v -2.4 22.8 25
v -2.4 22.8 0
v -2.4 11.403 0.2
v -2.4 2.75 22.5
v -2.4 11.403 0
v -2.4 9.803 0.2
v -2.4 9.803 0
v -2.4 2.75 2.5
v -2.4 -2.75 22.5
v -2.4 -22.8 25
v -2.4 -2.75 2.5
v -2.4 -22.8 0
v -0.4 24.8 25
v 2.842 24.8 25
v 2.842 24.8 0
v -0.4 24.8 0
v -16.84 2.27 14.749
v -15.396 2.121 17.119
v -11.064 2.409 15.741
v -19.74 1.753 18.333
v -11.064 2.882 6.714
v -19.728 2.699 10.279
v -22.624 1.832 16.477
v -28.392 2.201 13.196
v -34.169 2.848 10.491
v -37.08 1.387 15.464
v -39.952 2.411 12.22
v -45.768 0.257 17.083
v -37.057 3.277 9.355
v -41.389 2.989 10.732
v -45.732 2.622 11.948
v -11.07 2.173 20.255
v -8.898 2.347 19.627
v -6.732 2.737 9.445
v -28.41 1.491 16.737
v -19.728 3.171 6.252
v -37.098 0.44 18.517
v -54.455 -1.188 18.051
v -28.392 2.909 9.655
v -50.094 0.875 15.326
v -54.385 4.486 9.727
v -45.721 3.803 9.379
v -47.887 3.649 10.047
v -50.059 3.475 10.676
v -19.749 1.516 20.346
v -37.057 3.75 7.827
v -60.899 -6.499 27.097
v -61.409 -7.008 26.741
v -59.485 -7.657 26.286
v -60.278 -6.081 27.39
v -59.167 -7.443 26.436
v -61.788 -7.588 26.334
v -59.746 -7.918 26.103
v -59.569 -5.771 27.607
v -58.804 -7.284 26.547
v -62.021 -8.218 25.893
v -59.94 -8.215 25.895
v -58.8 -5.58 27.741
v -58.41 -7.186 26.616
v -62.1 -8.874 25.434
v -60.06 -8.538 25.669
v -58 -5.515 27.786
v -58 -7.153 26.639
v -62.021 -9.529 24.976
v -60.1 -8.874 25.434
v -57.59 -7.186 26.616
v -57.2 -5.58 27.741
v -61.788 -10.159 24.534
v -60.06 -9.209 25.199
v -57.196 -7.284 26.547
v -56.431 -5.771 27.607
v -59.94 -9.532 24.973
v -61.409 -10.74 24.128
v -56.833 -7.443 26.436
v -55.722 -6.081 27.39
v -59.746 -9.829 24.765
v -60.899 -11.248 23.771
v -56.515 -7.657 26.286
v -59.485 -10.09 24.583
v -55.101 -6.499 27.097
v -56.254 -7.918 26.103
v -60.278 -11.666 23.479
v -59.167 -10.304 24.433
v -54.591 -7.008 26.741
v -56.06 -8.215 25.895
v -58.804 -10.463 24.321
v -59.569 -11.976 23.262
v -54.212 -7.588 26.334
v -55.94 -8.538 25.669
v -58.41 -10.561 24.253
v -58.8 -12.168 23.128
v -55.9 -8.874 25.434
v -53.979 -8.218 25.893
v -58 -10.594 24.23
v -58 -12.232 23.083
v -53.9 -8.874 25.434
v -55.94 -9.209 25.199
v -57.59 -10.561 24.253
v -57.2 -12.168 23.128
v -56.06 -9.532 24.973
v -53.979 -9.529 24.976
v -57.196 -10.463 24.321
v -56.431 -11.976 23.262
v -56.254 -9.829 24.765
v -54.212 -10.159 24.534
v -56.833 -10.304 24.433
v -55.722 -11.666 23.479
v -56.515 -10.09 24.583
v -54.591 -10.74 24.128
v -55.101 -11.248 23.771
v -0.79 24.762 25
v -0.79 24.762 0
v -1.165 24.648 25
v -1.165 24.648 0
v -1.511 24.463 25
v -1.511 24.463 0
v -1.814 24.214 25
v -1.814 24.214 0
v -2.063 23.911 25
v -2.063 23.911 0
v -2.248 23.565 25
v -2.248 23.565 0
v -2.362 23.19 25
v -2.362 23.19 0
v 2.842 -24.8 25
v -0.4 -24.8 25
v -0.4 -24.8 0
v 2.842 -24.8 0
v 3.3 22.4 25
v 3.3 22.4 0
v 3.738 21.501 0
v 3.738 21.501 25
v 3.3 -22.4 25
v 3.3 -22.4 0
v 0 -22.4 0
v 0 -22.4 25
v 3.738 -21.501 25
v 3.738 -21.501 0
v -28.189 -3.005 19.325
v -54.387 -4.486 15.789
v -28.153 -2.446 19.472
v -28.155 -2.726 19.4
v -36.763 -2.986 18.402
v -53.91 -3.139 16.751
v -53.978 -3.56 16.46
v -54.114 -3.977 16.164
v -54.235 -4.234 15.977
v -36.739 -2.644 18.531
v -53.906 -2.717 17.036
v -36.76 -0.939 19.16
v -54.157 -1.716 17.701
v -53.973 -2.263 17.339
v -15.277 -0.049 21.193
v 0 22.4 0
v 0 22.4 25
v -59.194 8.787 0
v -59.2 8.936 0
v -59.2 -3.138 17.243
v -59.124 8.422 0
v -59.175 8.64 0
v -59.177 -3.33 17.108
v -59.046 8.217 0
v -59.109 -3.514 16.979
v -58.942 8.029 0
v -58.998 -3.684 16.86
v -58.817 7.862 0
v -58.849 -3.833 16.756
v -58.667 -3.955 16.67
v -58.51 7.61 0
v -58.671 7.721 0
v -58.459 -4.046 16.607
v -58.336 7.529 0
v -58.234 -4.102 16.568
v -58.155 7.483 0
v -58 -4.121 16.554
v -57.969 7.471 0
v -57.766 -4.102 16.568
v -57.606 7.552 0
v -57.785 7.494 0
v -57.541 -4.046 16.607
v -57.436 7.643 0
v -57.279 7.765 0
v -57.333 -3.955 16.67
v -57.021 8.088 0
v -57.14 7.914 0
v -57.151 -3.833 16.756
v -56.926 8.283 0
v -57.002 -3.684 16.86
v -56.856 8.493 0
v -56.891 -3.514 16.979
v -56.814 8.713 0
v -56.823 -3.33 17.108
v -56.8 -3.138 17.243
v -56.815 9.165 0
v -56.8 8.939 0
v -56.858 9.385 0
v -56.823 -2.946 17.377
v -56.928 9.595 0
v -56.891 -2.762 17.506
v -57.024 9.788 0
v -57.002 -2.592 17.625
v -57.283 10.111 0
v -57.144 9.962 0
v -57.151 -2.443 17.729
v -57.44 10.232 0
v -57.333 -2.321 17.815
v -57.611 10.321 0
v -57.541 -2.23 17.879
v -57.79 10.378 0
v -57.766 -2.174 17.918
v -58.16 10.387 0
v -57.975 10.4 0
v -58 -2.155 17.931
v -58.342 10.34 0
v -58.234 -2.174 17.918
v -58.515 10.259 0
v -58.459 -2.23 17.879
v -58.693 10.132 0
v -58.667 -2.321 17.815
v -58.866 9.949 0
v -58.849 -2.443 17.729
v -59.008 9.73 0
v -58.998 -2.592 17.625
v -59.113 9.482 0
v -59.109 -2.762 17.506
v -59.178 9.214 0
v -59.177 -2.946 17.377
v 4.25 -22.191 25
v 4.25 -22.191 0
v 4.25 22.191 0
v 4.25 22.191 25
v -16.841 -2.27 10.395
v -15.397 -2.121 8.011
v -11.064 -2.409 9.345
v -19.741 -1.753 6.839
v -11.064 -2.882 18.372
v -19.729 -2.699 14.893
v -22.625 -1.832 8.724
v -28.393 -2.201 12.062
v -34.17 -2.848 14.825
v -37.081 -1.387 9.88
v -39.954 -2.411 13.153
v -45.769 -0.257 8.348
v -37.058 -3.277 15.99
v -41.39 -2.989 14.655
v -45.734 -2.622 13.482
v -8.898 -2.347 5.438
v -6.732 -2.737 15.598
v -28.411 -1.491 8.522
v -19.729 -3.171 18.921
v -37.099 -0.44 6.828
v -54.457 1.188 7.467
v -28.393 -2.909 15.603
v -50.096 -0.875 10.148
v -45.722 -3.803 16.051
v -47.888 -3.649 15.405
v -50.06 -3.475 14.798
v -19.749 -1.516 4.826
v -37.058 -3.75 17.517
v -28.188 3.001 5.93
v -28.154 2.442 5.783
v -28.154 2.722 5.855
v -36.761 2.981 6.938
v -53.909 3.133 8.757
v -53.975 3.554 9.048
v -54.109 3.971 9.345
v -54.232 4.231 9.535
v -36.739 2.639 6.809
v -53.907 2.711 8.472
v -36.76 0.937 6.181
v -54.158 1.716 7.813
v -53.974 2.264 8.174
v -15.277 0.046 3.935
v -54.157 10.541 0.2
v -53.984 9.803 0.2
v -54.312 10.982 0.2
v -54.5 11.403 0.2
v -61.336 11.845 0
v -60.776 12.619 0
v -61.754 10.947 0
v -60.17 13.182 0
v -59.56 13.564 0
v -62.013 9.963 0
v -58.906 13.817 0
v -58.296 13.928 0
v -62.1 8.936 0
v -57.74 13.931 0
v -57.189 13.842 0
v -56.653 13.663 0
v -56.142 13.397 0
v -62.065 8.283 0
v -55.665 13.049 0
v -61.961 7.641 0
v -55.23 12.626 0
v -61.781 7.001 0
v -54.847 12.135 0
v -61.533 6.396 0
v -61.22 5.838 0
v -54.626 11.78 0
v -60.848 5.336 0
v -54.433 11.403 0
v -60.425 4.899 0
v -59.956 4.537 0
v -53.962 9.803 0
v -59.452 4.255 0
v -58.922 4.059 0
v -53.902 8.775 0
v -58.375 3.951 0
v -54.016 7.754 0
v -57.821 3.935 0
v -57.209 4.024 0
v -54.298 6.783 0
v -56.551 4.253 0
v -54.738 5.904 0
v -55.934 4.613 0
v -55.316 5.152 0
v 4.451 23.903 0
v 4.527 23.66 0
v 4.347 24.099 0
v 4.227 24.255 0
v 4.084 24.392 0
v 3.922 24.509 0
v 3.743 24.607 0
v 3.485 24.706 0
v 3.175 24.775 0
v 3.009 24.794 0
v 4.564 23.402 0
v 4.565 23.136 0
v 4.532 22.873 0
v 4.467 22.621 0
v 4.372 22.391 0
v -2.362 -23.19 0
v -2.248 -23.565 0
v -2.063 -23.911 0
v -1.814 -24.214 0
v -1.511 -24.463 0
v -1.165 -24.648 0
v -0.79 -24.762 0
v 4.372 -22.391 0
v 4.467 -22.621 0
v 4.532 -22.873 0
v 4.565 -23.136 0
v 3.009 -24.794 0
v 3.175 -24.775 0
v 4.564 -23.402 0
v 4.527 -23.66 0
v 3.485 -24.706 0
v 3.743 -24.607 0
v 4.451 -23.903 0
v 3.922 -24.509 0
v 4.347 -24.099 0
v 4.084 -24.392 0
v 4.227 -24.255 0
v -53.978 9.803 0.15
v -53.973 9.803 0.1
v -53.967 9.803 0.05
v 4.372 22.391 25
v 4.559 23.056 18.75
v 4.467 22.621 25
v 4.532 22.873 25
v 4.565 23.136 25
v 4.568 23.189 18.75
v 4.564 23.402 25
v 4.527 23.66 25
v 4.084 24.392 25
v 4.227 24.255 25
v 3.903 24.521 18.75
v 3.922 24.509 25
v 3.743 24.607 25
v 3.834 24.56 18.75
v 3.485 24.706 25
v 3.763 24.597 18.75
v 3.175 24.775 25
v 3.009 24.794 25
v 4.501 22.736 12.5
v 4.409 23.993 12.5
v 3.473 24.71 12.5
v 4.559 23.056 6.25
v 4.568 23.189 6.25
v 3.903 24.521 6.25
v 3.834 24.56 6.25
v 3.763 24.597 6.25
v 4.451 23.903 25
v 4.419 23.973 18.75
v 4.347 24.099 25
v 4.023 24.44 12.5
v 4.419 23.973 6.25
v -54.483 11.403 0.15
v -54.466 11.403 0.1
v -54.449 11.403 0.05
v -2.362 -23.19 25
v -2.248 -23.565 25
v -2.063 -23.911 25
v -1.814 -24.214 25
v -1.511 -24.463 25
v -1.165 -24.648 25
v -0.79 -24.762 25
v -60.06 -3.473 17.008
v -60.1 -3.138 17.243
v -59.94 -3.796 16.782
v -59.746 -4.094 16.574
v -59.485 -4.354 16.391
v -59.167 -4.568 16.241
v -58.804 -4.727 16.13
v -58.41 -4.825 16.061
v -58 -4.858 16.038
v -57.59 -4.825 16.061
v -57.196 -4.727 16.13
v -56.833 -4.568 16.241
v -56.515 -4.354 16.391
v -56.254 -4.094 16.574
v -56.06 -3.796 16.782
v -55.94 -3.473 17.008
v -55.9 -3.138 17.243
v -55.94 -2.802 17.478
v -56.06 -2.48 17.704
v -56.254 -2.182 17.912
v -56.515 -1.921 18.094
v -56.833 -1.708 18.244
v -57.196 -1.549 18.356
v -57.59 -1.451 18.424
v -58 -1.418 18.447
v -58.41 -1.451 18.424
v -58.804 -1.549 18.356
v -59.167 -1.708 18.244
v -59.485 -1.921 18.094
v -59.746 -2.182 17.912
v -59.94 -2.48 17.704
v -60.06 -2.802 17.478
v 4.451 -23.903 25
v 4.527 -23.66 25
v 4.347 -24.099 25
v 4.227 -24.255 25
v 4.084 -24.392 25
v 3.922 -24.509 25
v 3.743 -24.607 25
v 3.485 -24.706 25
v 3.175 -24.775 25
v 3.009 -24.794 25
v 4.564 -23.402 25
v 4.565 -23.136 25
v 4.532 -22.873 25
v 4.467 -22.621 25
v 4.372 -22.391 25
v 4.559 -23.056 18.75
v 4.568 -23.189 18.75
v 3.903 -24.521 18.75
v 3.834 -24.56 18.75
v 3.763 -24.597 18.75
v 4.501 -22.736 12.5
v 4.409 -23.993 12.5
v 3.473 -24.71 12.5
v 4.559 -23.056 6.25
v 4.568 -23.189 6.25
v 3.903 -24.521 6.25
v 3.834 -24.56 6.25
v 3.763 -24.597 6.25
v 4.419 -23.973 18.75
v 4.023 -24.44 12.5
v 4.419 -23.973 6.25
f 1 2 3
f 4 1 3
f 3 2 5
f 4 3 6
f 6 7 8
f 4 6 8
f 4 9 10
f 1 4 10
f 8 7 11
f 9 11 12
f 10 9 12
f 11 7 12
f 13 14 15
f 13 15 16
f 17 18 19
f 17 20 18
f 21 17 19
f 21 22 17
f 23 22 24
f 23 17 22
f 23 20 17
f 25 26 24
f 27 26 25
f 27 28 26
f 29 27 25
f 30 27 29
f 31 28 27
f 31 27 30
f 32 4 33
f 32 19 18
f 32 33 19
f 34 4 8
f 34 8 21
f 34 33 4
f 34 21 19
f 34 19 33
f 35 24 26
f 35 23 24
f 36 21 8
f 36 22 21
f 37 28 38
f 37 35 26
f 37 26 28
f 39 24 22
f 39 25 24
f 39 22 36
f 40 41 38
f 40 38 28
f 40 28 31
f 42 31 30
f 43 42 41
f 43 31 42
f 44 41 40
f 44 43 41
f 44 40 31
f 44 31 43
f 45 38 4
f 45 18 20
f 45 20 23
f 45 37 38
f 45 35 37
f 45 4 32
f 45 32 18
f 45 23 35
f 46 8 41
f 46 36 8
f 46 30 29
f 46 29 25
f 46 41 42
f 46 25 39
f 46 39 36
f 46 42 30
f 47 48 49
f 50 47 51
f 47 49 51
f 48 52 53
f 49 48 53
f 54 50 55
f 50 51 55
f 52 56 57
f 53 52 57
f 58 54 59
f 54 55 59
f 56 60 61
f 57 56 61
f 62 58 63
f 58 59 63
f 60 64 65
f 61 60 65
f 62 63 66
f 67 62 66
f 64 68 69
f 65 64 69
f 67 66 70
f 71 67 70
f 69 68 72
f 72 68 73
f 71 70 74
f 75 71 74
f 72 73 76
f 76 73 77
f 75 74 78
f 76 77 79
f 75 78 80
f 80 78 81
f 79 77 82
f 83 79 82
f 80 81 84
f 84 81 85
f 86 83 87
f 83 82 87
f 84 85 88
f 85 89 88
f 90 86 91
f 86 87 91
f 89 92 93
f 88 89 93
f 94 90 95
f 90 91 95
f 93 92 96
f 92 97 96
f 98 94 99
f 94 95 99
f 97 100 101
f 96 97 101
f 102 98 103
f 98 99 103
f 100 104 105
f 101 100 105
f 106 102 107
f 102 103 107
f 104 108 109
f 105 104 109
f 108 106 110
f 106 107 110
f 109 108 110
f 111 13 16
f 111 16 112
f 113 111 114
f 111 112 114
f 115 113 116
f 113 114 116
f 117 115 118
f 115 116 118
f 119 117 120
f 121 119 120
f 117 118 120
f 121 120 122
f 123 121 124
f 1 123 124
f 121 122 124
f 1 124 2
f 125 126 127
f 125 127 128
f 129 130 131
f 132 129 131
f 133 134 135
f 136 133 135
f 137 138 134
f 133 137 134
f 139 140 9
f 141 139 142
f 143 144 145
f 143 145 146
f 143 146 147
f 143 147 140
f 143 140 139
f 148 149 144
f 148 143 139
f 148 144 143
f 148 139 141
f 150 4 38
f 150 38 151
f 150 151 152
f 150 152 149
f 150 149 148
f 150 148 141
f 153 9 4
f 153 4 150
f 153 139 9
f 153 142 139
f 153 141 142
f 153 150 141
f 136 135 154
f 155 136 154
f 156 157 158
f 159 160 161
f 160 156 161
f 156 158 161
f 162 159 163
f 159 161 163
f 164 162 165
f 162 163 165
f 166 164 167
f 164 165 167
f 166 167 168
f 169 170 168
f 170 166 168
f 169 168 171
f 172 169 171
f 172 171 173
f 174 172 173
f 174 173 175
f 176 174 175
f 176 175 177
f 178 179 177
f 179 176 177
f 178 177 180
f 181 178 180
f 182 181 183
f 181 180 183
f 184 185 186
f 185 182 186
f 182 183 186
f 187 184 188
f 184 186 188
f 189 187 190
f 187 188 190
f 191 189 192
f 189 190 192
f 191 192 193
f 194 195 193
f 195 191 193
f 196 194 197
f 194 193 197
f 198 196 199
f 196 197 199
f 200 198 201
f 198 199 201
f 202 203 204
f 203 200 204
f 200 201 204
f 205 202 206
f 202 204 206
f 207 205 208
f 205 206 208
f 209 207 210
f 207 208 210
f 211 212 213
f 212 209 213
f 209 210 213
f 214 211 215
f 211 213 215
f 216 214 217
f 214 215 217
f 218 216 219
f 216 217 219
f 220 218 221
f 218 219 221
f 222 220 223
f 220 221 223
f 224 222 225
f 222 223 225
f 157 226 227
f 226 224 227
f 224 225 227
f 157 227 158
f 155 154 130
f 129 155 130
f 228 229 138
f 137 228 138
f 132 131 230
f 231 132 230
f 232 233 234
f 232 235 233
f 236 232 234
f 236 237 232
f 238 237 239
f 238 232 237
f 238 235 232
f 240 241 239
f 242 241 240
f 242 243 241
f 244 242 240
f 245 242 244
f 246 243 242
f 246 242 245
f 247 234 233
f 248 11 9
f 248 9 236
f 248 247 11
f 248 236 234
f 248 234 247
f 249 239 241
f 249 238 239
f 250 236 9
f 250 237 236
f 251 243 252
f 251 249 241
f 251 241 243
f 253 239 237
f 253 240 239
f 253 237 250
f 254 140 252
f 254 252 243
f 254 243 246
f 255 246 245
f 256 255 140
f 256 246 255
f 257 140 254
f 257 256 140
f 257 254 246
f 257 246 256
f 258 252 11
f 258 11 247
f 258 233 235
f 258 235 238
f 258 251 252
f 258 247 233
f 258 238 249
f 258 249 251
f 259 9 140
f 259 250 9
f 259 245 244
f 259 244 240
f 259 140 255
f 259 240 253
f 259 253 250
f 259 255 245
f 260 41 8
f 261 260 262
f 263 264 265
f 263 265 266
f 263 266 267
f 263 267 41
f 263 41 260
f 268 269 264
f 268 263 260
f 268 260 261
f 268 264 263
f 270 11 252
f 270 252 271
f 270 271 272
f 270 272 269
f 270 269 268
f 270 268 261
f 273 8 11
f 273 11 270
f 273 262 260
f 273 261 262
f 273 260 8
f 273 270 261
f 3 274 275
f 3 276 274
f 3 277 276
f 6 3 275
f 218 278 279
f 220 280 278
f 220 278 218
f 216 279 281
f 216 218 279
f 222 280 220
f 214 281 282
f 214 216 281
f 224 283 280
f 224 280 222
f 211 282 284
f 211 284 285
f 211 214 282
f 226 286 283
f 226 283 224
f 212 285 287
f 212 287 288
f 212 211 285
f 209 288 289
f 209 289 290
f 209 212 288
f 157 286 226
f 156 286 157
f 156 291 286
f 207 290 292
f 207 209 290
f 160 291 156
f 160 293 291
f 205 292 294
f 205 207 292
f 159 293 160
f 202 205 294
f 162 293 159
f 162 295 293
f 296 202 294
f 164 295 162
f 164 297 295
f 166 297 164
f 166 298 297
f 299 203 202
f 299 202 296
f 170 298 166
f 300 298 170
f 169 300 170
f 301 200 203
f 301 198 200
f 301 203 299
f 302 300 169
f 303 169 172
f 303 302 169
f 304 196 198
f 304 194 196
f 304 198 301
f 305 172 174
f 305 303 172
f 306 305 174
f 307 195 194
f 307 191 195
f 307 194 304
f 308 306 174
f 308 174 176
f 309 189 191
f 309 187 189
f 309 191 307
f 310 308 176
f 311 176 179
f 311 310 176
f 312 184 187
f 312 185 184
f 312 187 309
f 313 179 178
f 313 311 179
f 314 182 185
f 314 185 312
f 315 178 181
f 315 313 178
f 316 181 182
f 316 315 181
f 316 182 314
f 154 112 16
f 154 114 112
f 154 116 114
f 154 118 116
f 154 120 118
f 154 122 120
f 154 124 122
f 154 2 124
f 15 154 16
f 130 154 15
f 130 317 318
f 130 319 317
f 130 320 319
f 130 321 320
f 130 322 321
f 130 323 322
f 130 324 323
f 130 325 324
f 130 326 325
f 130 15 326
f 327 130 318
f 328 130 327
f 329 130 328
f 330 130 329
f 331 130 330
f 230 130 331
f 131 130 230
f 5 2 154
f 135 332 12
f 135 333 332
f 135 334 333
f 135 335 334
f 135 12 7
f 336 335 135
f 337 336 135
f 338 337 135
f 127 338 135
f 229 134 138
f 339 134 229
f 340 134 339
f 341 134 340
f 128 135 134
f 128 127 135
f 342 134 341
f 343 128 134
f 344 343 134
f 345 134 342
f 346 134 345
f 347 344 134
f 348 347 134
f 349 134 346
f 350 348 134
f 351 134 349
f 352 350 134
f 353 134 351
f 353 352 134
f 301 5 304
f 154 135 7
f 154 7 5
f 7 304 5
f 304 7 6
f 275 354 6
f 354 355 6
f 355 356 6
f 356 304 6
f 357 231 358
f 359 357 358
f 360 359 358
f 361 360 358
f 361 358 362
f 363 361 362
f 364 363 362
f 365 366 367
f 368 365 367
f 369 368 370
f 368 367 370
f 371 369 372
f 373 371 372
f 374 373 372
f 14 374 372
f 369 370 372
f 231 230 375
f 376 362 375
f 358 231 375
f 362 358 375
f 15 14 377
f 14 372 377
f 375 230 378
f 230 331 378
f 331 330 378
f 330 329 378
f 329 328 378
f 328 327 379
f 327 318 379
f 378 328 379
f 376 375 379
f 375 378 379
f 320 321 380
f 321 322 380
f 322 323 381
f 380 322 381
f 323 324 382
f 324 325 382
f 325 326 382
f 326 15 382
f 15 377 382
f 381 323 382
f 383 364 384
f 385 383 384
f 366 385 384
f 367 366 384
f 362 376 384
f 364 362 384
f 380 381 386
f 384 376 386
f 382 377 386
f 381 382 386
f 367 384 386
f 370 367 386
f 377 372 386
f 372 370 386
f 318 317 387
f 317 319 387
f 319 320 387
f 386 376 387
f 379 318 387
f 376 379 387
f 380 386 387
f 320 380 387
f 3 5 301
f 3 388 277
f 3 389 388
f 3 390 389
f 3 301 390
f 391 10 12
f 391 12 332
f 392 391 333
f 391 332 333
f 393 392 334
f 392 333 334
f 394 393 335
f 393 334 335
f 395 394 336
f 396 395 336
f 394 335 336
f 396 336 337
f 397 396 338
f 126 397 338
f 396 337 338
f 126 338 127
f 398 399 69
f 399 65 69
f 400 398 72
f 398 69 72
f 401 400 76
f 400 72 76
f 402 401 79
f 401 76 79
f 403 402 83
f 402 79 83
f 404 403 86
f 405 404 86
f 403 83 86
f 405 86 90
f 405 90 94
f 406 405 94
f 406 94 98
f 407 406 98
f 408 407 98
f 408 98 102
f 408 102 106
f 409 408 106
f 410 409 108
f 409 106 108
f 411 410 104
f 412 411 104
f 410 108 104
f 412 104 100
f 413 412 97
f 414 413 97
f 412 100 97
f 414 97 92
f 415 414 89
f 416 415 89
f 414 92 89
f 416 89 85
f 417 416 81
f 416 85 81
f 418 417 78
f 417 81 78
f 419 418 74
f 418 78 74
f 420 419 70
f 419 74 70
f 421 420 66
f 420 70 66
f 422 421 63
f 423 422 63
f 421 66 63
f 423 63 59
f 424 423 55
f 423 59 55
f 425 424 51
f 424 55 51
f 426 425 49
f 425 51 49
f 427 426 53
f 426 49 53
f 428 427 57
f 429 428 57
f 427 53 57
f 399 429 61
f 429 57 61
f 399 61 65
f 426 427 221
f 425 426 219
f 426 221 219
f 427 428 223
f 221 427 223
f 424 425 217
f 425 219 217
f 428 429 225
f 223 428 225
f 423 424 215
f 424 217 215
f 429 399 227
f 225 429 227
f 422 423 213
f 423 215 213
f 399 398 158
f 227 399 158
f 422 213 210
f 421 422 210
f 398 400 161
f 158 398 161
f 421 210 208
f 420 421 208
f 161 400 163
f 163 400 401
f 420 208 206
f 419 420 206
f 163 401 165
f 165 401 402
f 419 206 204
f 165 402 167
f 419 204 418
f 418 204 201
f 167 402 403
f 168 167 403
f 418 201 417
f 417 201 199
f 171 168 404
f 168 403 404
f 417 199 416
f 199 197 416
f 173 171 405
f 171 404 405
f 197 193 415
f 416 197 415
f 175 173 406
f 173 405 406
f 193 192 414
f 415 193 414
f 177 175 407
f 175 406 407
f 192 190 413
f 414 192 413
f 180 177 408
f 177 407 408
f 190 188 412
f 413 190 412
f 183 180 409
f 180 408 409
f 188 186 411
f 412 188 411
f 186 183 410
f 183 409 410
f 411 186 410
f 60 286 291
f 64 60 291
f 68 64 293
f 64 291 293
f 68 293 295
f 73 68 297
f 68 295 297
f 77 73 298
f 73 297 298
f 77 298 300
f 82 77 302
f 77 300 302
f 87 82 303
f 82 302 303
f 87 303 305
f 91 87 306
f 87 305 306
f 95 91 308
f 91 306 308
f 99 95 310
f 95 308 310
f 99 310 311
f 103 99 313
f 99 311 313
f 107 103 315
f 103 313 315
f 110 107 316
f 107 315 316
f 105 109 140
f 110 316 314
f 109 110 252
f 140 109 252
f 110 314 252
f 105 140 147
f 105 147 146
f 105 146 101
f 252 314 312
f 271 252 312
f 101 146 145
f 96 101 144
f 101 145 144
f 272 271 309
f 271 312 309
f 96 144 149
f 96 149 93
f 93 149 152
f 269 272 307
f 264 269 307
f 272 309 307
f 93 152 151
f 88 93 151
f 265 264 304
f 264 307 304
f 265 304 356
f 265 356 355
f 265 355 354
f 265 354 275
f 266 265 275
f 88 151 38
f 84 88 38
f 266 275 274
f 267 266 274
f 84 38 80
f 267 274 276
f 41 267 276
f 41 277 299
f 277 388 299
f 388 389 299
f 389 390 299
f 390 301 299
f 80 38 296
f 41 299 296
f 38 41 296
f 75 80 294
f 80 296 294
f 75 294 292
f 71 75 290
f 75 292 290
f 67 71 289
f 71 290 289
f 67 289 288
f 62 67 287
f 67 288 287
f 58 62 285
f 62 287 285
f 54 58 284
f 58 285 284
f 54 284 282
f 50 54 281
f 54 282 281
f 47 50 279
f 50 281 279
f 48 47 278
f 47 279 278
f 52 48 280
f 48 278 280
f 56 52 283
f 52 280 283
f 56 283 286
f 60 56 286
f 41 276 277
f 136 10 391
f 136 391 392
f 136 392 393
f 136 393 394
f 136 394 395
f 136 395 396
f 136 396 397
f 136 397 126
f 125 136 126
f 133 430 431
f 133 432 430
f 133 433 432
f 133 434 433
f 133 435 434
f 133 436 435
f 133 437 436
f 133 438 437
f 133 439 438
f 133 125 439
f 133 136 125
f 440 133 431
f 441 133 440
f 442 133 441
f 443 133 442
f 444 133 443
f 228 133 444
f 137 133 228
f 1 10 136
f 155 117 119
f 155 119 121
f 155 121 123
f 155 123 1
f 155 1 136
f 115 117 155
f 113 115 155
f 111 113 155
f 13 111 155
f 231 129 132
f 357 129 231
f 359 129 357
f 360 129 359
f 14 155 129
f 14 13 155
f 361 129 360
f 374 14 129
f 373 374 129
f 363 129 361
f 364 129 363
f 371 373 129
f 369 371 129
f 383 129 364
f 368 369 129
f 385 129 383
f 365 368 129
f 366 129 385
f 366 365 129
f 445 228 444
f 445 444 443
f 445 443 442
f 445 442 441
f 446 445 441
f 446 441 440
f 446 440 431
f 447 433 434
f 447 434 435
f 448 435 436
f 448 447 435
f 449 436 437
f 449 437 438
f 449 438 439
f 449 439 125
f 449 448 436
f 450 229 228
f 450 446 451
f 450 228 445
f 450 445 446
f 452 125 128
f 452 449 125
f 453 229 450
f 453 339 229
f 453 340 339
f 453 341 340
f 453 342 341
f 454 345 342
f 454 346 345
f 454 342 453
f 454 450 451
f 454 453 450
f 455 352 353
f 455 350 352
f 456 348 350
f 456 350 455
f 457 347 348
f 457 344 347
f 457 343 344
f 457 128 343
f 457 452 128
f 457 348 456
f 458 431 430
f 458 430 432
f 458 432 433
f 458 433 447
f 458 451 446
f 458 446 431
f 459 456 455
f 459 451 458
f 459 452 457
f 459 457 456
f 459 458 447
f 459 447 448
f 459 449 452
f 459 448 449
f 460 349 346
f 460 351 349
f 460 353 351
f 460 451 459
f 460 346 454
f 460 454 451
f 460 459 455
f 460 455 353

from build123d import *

# Parameters (mm, degrees)
F1_DEPTH  = 25
F4_W      = 5.5
F4_H      = 20
F9_W      = 27.424
F9_H      = 9.749
F10_DEPTH = 25
F11_W     = 1.6
F11_H     = 0.2


with BuildPart() as f1:
    # F0 (on Top) → F1 (new body)
    with BuildSketch(Plane.XY):
        with BuildLine():
            Line((0, -22.4), (0, 0))
            Line((0, 0), (0, 22.4))
            Line((0, 22.4), (3.3, 22.4))
            Line((3.3, 22.4), (3.7377447908, 21.5009007295))
            Line((3.7377447908, 21.5009007295), (4.2500217799, 22.1906429157))
            add(Edge.make_bspline(
                [(4.2500217799, 22.1906429157), (4.5826178906, 22.638458401), (4.7916104177, 24.2520123151), (3.4845446819, 24.8), (2.8422182777, 24.8)],
                knots=[0, 0, 0, 0, 0.5032486408, 1, 1, 1, 1], degree=3))
            Line((2.8422182777, 24.8), (-0.4, 24.8))
            ThreePointArc((-0.4, 24.8), (-1.8142135624, 24.2142135624), (-2.4, 22.8))
            Line((-2.4, 22.8), (-2.4, 0))
            Line((-2.4, 0), (-2.4, -22.8))
            ThreePointArc((-2.4, -22.8), (-1.8142135624, -24.2142135624), (-0.4, -24.8))
            Line((-0.4, -24.8), (2.8422182777, -24.8))
            add(Edge.make_bspline(
                [(4.2500217799, -22.1906429157), (4.5826178906, -22.638458401), (4.7916104177, -24.2520123151), (3.4845446819, -24.8), (2.8422182777, -24.8)],
                knots=[0, 0, 0, 0, 0.5032486408, 1, 1, 1, 1], degree=3))
            Line((4.2500217799, -22.1906429157), (3.7377447908, -21.5009007295))
            Line((3.7377447908, -21.5009007295), (3.3, -22.4))
            Line((3.3, -22.4), (0, -22.4))
        make_face()
    extrude(amount=F1_DEPTH)

    # F4 (on face) → F5 section 0
    with BuildSketch(Plane(origin=(-2.4, 0, 0), x_dir=(0, -1, 0), z_dir=(-1, 0, 0))):
        with Locations((0, 12.5)):
            Rectangle(F4_W, F4_H)
    # F3 (on offset) → F5 section 1
    with BuildSketch(Plane.YZ.offset(-55)):
        Polygon((4.5061862703, 9.812834642), (-1.2295780932, 18.0043550849), (-4.5061862703, 15.7100493395), (1.2295780932, 7.5185288966), align=None)
    loft()

    # F7 (on face) → F8 (revolve)
    with BuildSketch(Plane(origin=(0, 5.9959164346, 4.198385886), x_dir=(1, 0, 0), z_dir=(0, -0.8191520443, -0.5735764364))):
        Polygon((-59.2, -9.0757438921), (-59.2, 15.9242561079), (-60.1, 15.9242561079), (-60.1, 25.9242561079), (-62.1, 25.9242561079), (-62.1, -9.0757438921), align=None)
    revolve(axis=Axis((-58, -0.1314634537, 12.94919126), (0, -0.5735764364, 0.8191520443)))

    # F9 (on Front) → F10 (cut)
    with BuildSketch(Plane.XZ):
        with Locations((-57.2514572268, -4.8745)):
            Rectangle(F9_W, F9_H)
    extrude(amount=-F10_DEPTH, mode=Mode.SUBTRACT)

    # F11 (on face) → F12 (join, up to the next surface of F1)
    with BuildSketch(Plane(origin=(-2.4, 0, 0), x_dir=(0, -1, 0), z_dir=(-1, 0, 0))):
        with Locations((-10.6029133692, 0.1)):
            Rectangle(F11_W, F11_H)
    extrude(until=Until.NEXT)


solid = f1.part
